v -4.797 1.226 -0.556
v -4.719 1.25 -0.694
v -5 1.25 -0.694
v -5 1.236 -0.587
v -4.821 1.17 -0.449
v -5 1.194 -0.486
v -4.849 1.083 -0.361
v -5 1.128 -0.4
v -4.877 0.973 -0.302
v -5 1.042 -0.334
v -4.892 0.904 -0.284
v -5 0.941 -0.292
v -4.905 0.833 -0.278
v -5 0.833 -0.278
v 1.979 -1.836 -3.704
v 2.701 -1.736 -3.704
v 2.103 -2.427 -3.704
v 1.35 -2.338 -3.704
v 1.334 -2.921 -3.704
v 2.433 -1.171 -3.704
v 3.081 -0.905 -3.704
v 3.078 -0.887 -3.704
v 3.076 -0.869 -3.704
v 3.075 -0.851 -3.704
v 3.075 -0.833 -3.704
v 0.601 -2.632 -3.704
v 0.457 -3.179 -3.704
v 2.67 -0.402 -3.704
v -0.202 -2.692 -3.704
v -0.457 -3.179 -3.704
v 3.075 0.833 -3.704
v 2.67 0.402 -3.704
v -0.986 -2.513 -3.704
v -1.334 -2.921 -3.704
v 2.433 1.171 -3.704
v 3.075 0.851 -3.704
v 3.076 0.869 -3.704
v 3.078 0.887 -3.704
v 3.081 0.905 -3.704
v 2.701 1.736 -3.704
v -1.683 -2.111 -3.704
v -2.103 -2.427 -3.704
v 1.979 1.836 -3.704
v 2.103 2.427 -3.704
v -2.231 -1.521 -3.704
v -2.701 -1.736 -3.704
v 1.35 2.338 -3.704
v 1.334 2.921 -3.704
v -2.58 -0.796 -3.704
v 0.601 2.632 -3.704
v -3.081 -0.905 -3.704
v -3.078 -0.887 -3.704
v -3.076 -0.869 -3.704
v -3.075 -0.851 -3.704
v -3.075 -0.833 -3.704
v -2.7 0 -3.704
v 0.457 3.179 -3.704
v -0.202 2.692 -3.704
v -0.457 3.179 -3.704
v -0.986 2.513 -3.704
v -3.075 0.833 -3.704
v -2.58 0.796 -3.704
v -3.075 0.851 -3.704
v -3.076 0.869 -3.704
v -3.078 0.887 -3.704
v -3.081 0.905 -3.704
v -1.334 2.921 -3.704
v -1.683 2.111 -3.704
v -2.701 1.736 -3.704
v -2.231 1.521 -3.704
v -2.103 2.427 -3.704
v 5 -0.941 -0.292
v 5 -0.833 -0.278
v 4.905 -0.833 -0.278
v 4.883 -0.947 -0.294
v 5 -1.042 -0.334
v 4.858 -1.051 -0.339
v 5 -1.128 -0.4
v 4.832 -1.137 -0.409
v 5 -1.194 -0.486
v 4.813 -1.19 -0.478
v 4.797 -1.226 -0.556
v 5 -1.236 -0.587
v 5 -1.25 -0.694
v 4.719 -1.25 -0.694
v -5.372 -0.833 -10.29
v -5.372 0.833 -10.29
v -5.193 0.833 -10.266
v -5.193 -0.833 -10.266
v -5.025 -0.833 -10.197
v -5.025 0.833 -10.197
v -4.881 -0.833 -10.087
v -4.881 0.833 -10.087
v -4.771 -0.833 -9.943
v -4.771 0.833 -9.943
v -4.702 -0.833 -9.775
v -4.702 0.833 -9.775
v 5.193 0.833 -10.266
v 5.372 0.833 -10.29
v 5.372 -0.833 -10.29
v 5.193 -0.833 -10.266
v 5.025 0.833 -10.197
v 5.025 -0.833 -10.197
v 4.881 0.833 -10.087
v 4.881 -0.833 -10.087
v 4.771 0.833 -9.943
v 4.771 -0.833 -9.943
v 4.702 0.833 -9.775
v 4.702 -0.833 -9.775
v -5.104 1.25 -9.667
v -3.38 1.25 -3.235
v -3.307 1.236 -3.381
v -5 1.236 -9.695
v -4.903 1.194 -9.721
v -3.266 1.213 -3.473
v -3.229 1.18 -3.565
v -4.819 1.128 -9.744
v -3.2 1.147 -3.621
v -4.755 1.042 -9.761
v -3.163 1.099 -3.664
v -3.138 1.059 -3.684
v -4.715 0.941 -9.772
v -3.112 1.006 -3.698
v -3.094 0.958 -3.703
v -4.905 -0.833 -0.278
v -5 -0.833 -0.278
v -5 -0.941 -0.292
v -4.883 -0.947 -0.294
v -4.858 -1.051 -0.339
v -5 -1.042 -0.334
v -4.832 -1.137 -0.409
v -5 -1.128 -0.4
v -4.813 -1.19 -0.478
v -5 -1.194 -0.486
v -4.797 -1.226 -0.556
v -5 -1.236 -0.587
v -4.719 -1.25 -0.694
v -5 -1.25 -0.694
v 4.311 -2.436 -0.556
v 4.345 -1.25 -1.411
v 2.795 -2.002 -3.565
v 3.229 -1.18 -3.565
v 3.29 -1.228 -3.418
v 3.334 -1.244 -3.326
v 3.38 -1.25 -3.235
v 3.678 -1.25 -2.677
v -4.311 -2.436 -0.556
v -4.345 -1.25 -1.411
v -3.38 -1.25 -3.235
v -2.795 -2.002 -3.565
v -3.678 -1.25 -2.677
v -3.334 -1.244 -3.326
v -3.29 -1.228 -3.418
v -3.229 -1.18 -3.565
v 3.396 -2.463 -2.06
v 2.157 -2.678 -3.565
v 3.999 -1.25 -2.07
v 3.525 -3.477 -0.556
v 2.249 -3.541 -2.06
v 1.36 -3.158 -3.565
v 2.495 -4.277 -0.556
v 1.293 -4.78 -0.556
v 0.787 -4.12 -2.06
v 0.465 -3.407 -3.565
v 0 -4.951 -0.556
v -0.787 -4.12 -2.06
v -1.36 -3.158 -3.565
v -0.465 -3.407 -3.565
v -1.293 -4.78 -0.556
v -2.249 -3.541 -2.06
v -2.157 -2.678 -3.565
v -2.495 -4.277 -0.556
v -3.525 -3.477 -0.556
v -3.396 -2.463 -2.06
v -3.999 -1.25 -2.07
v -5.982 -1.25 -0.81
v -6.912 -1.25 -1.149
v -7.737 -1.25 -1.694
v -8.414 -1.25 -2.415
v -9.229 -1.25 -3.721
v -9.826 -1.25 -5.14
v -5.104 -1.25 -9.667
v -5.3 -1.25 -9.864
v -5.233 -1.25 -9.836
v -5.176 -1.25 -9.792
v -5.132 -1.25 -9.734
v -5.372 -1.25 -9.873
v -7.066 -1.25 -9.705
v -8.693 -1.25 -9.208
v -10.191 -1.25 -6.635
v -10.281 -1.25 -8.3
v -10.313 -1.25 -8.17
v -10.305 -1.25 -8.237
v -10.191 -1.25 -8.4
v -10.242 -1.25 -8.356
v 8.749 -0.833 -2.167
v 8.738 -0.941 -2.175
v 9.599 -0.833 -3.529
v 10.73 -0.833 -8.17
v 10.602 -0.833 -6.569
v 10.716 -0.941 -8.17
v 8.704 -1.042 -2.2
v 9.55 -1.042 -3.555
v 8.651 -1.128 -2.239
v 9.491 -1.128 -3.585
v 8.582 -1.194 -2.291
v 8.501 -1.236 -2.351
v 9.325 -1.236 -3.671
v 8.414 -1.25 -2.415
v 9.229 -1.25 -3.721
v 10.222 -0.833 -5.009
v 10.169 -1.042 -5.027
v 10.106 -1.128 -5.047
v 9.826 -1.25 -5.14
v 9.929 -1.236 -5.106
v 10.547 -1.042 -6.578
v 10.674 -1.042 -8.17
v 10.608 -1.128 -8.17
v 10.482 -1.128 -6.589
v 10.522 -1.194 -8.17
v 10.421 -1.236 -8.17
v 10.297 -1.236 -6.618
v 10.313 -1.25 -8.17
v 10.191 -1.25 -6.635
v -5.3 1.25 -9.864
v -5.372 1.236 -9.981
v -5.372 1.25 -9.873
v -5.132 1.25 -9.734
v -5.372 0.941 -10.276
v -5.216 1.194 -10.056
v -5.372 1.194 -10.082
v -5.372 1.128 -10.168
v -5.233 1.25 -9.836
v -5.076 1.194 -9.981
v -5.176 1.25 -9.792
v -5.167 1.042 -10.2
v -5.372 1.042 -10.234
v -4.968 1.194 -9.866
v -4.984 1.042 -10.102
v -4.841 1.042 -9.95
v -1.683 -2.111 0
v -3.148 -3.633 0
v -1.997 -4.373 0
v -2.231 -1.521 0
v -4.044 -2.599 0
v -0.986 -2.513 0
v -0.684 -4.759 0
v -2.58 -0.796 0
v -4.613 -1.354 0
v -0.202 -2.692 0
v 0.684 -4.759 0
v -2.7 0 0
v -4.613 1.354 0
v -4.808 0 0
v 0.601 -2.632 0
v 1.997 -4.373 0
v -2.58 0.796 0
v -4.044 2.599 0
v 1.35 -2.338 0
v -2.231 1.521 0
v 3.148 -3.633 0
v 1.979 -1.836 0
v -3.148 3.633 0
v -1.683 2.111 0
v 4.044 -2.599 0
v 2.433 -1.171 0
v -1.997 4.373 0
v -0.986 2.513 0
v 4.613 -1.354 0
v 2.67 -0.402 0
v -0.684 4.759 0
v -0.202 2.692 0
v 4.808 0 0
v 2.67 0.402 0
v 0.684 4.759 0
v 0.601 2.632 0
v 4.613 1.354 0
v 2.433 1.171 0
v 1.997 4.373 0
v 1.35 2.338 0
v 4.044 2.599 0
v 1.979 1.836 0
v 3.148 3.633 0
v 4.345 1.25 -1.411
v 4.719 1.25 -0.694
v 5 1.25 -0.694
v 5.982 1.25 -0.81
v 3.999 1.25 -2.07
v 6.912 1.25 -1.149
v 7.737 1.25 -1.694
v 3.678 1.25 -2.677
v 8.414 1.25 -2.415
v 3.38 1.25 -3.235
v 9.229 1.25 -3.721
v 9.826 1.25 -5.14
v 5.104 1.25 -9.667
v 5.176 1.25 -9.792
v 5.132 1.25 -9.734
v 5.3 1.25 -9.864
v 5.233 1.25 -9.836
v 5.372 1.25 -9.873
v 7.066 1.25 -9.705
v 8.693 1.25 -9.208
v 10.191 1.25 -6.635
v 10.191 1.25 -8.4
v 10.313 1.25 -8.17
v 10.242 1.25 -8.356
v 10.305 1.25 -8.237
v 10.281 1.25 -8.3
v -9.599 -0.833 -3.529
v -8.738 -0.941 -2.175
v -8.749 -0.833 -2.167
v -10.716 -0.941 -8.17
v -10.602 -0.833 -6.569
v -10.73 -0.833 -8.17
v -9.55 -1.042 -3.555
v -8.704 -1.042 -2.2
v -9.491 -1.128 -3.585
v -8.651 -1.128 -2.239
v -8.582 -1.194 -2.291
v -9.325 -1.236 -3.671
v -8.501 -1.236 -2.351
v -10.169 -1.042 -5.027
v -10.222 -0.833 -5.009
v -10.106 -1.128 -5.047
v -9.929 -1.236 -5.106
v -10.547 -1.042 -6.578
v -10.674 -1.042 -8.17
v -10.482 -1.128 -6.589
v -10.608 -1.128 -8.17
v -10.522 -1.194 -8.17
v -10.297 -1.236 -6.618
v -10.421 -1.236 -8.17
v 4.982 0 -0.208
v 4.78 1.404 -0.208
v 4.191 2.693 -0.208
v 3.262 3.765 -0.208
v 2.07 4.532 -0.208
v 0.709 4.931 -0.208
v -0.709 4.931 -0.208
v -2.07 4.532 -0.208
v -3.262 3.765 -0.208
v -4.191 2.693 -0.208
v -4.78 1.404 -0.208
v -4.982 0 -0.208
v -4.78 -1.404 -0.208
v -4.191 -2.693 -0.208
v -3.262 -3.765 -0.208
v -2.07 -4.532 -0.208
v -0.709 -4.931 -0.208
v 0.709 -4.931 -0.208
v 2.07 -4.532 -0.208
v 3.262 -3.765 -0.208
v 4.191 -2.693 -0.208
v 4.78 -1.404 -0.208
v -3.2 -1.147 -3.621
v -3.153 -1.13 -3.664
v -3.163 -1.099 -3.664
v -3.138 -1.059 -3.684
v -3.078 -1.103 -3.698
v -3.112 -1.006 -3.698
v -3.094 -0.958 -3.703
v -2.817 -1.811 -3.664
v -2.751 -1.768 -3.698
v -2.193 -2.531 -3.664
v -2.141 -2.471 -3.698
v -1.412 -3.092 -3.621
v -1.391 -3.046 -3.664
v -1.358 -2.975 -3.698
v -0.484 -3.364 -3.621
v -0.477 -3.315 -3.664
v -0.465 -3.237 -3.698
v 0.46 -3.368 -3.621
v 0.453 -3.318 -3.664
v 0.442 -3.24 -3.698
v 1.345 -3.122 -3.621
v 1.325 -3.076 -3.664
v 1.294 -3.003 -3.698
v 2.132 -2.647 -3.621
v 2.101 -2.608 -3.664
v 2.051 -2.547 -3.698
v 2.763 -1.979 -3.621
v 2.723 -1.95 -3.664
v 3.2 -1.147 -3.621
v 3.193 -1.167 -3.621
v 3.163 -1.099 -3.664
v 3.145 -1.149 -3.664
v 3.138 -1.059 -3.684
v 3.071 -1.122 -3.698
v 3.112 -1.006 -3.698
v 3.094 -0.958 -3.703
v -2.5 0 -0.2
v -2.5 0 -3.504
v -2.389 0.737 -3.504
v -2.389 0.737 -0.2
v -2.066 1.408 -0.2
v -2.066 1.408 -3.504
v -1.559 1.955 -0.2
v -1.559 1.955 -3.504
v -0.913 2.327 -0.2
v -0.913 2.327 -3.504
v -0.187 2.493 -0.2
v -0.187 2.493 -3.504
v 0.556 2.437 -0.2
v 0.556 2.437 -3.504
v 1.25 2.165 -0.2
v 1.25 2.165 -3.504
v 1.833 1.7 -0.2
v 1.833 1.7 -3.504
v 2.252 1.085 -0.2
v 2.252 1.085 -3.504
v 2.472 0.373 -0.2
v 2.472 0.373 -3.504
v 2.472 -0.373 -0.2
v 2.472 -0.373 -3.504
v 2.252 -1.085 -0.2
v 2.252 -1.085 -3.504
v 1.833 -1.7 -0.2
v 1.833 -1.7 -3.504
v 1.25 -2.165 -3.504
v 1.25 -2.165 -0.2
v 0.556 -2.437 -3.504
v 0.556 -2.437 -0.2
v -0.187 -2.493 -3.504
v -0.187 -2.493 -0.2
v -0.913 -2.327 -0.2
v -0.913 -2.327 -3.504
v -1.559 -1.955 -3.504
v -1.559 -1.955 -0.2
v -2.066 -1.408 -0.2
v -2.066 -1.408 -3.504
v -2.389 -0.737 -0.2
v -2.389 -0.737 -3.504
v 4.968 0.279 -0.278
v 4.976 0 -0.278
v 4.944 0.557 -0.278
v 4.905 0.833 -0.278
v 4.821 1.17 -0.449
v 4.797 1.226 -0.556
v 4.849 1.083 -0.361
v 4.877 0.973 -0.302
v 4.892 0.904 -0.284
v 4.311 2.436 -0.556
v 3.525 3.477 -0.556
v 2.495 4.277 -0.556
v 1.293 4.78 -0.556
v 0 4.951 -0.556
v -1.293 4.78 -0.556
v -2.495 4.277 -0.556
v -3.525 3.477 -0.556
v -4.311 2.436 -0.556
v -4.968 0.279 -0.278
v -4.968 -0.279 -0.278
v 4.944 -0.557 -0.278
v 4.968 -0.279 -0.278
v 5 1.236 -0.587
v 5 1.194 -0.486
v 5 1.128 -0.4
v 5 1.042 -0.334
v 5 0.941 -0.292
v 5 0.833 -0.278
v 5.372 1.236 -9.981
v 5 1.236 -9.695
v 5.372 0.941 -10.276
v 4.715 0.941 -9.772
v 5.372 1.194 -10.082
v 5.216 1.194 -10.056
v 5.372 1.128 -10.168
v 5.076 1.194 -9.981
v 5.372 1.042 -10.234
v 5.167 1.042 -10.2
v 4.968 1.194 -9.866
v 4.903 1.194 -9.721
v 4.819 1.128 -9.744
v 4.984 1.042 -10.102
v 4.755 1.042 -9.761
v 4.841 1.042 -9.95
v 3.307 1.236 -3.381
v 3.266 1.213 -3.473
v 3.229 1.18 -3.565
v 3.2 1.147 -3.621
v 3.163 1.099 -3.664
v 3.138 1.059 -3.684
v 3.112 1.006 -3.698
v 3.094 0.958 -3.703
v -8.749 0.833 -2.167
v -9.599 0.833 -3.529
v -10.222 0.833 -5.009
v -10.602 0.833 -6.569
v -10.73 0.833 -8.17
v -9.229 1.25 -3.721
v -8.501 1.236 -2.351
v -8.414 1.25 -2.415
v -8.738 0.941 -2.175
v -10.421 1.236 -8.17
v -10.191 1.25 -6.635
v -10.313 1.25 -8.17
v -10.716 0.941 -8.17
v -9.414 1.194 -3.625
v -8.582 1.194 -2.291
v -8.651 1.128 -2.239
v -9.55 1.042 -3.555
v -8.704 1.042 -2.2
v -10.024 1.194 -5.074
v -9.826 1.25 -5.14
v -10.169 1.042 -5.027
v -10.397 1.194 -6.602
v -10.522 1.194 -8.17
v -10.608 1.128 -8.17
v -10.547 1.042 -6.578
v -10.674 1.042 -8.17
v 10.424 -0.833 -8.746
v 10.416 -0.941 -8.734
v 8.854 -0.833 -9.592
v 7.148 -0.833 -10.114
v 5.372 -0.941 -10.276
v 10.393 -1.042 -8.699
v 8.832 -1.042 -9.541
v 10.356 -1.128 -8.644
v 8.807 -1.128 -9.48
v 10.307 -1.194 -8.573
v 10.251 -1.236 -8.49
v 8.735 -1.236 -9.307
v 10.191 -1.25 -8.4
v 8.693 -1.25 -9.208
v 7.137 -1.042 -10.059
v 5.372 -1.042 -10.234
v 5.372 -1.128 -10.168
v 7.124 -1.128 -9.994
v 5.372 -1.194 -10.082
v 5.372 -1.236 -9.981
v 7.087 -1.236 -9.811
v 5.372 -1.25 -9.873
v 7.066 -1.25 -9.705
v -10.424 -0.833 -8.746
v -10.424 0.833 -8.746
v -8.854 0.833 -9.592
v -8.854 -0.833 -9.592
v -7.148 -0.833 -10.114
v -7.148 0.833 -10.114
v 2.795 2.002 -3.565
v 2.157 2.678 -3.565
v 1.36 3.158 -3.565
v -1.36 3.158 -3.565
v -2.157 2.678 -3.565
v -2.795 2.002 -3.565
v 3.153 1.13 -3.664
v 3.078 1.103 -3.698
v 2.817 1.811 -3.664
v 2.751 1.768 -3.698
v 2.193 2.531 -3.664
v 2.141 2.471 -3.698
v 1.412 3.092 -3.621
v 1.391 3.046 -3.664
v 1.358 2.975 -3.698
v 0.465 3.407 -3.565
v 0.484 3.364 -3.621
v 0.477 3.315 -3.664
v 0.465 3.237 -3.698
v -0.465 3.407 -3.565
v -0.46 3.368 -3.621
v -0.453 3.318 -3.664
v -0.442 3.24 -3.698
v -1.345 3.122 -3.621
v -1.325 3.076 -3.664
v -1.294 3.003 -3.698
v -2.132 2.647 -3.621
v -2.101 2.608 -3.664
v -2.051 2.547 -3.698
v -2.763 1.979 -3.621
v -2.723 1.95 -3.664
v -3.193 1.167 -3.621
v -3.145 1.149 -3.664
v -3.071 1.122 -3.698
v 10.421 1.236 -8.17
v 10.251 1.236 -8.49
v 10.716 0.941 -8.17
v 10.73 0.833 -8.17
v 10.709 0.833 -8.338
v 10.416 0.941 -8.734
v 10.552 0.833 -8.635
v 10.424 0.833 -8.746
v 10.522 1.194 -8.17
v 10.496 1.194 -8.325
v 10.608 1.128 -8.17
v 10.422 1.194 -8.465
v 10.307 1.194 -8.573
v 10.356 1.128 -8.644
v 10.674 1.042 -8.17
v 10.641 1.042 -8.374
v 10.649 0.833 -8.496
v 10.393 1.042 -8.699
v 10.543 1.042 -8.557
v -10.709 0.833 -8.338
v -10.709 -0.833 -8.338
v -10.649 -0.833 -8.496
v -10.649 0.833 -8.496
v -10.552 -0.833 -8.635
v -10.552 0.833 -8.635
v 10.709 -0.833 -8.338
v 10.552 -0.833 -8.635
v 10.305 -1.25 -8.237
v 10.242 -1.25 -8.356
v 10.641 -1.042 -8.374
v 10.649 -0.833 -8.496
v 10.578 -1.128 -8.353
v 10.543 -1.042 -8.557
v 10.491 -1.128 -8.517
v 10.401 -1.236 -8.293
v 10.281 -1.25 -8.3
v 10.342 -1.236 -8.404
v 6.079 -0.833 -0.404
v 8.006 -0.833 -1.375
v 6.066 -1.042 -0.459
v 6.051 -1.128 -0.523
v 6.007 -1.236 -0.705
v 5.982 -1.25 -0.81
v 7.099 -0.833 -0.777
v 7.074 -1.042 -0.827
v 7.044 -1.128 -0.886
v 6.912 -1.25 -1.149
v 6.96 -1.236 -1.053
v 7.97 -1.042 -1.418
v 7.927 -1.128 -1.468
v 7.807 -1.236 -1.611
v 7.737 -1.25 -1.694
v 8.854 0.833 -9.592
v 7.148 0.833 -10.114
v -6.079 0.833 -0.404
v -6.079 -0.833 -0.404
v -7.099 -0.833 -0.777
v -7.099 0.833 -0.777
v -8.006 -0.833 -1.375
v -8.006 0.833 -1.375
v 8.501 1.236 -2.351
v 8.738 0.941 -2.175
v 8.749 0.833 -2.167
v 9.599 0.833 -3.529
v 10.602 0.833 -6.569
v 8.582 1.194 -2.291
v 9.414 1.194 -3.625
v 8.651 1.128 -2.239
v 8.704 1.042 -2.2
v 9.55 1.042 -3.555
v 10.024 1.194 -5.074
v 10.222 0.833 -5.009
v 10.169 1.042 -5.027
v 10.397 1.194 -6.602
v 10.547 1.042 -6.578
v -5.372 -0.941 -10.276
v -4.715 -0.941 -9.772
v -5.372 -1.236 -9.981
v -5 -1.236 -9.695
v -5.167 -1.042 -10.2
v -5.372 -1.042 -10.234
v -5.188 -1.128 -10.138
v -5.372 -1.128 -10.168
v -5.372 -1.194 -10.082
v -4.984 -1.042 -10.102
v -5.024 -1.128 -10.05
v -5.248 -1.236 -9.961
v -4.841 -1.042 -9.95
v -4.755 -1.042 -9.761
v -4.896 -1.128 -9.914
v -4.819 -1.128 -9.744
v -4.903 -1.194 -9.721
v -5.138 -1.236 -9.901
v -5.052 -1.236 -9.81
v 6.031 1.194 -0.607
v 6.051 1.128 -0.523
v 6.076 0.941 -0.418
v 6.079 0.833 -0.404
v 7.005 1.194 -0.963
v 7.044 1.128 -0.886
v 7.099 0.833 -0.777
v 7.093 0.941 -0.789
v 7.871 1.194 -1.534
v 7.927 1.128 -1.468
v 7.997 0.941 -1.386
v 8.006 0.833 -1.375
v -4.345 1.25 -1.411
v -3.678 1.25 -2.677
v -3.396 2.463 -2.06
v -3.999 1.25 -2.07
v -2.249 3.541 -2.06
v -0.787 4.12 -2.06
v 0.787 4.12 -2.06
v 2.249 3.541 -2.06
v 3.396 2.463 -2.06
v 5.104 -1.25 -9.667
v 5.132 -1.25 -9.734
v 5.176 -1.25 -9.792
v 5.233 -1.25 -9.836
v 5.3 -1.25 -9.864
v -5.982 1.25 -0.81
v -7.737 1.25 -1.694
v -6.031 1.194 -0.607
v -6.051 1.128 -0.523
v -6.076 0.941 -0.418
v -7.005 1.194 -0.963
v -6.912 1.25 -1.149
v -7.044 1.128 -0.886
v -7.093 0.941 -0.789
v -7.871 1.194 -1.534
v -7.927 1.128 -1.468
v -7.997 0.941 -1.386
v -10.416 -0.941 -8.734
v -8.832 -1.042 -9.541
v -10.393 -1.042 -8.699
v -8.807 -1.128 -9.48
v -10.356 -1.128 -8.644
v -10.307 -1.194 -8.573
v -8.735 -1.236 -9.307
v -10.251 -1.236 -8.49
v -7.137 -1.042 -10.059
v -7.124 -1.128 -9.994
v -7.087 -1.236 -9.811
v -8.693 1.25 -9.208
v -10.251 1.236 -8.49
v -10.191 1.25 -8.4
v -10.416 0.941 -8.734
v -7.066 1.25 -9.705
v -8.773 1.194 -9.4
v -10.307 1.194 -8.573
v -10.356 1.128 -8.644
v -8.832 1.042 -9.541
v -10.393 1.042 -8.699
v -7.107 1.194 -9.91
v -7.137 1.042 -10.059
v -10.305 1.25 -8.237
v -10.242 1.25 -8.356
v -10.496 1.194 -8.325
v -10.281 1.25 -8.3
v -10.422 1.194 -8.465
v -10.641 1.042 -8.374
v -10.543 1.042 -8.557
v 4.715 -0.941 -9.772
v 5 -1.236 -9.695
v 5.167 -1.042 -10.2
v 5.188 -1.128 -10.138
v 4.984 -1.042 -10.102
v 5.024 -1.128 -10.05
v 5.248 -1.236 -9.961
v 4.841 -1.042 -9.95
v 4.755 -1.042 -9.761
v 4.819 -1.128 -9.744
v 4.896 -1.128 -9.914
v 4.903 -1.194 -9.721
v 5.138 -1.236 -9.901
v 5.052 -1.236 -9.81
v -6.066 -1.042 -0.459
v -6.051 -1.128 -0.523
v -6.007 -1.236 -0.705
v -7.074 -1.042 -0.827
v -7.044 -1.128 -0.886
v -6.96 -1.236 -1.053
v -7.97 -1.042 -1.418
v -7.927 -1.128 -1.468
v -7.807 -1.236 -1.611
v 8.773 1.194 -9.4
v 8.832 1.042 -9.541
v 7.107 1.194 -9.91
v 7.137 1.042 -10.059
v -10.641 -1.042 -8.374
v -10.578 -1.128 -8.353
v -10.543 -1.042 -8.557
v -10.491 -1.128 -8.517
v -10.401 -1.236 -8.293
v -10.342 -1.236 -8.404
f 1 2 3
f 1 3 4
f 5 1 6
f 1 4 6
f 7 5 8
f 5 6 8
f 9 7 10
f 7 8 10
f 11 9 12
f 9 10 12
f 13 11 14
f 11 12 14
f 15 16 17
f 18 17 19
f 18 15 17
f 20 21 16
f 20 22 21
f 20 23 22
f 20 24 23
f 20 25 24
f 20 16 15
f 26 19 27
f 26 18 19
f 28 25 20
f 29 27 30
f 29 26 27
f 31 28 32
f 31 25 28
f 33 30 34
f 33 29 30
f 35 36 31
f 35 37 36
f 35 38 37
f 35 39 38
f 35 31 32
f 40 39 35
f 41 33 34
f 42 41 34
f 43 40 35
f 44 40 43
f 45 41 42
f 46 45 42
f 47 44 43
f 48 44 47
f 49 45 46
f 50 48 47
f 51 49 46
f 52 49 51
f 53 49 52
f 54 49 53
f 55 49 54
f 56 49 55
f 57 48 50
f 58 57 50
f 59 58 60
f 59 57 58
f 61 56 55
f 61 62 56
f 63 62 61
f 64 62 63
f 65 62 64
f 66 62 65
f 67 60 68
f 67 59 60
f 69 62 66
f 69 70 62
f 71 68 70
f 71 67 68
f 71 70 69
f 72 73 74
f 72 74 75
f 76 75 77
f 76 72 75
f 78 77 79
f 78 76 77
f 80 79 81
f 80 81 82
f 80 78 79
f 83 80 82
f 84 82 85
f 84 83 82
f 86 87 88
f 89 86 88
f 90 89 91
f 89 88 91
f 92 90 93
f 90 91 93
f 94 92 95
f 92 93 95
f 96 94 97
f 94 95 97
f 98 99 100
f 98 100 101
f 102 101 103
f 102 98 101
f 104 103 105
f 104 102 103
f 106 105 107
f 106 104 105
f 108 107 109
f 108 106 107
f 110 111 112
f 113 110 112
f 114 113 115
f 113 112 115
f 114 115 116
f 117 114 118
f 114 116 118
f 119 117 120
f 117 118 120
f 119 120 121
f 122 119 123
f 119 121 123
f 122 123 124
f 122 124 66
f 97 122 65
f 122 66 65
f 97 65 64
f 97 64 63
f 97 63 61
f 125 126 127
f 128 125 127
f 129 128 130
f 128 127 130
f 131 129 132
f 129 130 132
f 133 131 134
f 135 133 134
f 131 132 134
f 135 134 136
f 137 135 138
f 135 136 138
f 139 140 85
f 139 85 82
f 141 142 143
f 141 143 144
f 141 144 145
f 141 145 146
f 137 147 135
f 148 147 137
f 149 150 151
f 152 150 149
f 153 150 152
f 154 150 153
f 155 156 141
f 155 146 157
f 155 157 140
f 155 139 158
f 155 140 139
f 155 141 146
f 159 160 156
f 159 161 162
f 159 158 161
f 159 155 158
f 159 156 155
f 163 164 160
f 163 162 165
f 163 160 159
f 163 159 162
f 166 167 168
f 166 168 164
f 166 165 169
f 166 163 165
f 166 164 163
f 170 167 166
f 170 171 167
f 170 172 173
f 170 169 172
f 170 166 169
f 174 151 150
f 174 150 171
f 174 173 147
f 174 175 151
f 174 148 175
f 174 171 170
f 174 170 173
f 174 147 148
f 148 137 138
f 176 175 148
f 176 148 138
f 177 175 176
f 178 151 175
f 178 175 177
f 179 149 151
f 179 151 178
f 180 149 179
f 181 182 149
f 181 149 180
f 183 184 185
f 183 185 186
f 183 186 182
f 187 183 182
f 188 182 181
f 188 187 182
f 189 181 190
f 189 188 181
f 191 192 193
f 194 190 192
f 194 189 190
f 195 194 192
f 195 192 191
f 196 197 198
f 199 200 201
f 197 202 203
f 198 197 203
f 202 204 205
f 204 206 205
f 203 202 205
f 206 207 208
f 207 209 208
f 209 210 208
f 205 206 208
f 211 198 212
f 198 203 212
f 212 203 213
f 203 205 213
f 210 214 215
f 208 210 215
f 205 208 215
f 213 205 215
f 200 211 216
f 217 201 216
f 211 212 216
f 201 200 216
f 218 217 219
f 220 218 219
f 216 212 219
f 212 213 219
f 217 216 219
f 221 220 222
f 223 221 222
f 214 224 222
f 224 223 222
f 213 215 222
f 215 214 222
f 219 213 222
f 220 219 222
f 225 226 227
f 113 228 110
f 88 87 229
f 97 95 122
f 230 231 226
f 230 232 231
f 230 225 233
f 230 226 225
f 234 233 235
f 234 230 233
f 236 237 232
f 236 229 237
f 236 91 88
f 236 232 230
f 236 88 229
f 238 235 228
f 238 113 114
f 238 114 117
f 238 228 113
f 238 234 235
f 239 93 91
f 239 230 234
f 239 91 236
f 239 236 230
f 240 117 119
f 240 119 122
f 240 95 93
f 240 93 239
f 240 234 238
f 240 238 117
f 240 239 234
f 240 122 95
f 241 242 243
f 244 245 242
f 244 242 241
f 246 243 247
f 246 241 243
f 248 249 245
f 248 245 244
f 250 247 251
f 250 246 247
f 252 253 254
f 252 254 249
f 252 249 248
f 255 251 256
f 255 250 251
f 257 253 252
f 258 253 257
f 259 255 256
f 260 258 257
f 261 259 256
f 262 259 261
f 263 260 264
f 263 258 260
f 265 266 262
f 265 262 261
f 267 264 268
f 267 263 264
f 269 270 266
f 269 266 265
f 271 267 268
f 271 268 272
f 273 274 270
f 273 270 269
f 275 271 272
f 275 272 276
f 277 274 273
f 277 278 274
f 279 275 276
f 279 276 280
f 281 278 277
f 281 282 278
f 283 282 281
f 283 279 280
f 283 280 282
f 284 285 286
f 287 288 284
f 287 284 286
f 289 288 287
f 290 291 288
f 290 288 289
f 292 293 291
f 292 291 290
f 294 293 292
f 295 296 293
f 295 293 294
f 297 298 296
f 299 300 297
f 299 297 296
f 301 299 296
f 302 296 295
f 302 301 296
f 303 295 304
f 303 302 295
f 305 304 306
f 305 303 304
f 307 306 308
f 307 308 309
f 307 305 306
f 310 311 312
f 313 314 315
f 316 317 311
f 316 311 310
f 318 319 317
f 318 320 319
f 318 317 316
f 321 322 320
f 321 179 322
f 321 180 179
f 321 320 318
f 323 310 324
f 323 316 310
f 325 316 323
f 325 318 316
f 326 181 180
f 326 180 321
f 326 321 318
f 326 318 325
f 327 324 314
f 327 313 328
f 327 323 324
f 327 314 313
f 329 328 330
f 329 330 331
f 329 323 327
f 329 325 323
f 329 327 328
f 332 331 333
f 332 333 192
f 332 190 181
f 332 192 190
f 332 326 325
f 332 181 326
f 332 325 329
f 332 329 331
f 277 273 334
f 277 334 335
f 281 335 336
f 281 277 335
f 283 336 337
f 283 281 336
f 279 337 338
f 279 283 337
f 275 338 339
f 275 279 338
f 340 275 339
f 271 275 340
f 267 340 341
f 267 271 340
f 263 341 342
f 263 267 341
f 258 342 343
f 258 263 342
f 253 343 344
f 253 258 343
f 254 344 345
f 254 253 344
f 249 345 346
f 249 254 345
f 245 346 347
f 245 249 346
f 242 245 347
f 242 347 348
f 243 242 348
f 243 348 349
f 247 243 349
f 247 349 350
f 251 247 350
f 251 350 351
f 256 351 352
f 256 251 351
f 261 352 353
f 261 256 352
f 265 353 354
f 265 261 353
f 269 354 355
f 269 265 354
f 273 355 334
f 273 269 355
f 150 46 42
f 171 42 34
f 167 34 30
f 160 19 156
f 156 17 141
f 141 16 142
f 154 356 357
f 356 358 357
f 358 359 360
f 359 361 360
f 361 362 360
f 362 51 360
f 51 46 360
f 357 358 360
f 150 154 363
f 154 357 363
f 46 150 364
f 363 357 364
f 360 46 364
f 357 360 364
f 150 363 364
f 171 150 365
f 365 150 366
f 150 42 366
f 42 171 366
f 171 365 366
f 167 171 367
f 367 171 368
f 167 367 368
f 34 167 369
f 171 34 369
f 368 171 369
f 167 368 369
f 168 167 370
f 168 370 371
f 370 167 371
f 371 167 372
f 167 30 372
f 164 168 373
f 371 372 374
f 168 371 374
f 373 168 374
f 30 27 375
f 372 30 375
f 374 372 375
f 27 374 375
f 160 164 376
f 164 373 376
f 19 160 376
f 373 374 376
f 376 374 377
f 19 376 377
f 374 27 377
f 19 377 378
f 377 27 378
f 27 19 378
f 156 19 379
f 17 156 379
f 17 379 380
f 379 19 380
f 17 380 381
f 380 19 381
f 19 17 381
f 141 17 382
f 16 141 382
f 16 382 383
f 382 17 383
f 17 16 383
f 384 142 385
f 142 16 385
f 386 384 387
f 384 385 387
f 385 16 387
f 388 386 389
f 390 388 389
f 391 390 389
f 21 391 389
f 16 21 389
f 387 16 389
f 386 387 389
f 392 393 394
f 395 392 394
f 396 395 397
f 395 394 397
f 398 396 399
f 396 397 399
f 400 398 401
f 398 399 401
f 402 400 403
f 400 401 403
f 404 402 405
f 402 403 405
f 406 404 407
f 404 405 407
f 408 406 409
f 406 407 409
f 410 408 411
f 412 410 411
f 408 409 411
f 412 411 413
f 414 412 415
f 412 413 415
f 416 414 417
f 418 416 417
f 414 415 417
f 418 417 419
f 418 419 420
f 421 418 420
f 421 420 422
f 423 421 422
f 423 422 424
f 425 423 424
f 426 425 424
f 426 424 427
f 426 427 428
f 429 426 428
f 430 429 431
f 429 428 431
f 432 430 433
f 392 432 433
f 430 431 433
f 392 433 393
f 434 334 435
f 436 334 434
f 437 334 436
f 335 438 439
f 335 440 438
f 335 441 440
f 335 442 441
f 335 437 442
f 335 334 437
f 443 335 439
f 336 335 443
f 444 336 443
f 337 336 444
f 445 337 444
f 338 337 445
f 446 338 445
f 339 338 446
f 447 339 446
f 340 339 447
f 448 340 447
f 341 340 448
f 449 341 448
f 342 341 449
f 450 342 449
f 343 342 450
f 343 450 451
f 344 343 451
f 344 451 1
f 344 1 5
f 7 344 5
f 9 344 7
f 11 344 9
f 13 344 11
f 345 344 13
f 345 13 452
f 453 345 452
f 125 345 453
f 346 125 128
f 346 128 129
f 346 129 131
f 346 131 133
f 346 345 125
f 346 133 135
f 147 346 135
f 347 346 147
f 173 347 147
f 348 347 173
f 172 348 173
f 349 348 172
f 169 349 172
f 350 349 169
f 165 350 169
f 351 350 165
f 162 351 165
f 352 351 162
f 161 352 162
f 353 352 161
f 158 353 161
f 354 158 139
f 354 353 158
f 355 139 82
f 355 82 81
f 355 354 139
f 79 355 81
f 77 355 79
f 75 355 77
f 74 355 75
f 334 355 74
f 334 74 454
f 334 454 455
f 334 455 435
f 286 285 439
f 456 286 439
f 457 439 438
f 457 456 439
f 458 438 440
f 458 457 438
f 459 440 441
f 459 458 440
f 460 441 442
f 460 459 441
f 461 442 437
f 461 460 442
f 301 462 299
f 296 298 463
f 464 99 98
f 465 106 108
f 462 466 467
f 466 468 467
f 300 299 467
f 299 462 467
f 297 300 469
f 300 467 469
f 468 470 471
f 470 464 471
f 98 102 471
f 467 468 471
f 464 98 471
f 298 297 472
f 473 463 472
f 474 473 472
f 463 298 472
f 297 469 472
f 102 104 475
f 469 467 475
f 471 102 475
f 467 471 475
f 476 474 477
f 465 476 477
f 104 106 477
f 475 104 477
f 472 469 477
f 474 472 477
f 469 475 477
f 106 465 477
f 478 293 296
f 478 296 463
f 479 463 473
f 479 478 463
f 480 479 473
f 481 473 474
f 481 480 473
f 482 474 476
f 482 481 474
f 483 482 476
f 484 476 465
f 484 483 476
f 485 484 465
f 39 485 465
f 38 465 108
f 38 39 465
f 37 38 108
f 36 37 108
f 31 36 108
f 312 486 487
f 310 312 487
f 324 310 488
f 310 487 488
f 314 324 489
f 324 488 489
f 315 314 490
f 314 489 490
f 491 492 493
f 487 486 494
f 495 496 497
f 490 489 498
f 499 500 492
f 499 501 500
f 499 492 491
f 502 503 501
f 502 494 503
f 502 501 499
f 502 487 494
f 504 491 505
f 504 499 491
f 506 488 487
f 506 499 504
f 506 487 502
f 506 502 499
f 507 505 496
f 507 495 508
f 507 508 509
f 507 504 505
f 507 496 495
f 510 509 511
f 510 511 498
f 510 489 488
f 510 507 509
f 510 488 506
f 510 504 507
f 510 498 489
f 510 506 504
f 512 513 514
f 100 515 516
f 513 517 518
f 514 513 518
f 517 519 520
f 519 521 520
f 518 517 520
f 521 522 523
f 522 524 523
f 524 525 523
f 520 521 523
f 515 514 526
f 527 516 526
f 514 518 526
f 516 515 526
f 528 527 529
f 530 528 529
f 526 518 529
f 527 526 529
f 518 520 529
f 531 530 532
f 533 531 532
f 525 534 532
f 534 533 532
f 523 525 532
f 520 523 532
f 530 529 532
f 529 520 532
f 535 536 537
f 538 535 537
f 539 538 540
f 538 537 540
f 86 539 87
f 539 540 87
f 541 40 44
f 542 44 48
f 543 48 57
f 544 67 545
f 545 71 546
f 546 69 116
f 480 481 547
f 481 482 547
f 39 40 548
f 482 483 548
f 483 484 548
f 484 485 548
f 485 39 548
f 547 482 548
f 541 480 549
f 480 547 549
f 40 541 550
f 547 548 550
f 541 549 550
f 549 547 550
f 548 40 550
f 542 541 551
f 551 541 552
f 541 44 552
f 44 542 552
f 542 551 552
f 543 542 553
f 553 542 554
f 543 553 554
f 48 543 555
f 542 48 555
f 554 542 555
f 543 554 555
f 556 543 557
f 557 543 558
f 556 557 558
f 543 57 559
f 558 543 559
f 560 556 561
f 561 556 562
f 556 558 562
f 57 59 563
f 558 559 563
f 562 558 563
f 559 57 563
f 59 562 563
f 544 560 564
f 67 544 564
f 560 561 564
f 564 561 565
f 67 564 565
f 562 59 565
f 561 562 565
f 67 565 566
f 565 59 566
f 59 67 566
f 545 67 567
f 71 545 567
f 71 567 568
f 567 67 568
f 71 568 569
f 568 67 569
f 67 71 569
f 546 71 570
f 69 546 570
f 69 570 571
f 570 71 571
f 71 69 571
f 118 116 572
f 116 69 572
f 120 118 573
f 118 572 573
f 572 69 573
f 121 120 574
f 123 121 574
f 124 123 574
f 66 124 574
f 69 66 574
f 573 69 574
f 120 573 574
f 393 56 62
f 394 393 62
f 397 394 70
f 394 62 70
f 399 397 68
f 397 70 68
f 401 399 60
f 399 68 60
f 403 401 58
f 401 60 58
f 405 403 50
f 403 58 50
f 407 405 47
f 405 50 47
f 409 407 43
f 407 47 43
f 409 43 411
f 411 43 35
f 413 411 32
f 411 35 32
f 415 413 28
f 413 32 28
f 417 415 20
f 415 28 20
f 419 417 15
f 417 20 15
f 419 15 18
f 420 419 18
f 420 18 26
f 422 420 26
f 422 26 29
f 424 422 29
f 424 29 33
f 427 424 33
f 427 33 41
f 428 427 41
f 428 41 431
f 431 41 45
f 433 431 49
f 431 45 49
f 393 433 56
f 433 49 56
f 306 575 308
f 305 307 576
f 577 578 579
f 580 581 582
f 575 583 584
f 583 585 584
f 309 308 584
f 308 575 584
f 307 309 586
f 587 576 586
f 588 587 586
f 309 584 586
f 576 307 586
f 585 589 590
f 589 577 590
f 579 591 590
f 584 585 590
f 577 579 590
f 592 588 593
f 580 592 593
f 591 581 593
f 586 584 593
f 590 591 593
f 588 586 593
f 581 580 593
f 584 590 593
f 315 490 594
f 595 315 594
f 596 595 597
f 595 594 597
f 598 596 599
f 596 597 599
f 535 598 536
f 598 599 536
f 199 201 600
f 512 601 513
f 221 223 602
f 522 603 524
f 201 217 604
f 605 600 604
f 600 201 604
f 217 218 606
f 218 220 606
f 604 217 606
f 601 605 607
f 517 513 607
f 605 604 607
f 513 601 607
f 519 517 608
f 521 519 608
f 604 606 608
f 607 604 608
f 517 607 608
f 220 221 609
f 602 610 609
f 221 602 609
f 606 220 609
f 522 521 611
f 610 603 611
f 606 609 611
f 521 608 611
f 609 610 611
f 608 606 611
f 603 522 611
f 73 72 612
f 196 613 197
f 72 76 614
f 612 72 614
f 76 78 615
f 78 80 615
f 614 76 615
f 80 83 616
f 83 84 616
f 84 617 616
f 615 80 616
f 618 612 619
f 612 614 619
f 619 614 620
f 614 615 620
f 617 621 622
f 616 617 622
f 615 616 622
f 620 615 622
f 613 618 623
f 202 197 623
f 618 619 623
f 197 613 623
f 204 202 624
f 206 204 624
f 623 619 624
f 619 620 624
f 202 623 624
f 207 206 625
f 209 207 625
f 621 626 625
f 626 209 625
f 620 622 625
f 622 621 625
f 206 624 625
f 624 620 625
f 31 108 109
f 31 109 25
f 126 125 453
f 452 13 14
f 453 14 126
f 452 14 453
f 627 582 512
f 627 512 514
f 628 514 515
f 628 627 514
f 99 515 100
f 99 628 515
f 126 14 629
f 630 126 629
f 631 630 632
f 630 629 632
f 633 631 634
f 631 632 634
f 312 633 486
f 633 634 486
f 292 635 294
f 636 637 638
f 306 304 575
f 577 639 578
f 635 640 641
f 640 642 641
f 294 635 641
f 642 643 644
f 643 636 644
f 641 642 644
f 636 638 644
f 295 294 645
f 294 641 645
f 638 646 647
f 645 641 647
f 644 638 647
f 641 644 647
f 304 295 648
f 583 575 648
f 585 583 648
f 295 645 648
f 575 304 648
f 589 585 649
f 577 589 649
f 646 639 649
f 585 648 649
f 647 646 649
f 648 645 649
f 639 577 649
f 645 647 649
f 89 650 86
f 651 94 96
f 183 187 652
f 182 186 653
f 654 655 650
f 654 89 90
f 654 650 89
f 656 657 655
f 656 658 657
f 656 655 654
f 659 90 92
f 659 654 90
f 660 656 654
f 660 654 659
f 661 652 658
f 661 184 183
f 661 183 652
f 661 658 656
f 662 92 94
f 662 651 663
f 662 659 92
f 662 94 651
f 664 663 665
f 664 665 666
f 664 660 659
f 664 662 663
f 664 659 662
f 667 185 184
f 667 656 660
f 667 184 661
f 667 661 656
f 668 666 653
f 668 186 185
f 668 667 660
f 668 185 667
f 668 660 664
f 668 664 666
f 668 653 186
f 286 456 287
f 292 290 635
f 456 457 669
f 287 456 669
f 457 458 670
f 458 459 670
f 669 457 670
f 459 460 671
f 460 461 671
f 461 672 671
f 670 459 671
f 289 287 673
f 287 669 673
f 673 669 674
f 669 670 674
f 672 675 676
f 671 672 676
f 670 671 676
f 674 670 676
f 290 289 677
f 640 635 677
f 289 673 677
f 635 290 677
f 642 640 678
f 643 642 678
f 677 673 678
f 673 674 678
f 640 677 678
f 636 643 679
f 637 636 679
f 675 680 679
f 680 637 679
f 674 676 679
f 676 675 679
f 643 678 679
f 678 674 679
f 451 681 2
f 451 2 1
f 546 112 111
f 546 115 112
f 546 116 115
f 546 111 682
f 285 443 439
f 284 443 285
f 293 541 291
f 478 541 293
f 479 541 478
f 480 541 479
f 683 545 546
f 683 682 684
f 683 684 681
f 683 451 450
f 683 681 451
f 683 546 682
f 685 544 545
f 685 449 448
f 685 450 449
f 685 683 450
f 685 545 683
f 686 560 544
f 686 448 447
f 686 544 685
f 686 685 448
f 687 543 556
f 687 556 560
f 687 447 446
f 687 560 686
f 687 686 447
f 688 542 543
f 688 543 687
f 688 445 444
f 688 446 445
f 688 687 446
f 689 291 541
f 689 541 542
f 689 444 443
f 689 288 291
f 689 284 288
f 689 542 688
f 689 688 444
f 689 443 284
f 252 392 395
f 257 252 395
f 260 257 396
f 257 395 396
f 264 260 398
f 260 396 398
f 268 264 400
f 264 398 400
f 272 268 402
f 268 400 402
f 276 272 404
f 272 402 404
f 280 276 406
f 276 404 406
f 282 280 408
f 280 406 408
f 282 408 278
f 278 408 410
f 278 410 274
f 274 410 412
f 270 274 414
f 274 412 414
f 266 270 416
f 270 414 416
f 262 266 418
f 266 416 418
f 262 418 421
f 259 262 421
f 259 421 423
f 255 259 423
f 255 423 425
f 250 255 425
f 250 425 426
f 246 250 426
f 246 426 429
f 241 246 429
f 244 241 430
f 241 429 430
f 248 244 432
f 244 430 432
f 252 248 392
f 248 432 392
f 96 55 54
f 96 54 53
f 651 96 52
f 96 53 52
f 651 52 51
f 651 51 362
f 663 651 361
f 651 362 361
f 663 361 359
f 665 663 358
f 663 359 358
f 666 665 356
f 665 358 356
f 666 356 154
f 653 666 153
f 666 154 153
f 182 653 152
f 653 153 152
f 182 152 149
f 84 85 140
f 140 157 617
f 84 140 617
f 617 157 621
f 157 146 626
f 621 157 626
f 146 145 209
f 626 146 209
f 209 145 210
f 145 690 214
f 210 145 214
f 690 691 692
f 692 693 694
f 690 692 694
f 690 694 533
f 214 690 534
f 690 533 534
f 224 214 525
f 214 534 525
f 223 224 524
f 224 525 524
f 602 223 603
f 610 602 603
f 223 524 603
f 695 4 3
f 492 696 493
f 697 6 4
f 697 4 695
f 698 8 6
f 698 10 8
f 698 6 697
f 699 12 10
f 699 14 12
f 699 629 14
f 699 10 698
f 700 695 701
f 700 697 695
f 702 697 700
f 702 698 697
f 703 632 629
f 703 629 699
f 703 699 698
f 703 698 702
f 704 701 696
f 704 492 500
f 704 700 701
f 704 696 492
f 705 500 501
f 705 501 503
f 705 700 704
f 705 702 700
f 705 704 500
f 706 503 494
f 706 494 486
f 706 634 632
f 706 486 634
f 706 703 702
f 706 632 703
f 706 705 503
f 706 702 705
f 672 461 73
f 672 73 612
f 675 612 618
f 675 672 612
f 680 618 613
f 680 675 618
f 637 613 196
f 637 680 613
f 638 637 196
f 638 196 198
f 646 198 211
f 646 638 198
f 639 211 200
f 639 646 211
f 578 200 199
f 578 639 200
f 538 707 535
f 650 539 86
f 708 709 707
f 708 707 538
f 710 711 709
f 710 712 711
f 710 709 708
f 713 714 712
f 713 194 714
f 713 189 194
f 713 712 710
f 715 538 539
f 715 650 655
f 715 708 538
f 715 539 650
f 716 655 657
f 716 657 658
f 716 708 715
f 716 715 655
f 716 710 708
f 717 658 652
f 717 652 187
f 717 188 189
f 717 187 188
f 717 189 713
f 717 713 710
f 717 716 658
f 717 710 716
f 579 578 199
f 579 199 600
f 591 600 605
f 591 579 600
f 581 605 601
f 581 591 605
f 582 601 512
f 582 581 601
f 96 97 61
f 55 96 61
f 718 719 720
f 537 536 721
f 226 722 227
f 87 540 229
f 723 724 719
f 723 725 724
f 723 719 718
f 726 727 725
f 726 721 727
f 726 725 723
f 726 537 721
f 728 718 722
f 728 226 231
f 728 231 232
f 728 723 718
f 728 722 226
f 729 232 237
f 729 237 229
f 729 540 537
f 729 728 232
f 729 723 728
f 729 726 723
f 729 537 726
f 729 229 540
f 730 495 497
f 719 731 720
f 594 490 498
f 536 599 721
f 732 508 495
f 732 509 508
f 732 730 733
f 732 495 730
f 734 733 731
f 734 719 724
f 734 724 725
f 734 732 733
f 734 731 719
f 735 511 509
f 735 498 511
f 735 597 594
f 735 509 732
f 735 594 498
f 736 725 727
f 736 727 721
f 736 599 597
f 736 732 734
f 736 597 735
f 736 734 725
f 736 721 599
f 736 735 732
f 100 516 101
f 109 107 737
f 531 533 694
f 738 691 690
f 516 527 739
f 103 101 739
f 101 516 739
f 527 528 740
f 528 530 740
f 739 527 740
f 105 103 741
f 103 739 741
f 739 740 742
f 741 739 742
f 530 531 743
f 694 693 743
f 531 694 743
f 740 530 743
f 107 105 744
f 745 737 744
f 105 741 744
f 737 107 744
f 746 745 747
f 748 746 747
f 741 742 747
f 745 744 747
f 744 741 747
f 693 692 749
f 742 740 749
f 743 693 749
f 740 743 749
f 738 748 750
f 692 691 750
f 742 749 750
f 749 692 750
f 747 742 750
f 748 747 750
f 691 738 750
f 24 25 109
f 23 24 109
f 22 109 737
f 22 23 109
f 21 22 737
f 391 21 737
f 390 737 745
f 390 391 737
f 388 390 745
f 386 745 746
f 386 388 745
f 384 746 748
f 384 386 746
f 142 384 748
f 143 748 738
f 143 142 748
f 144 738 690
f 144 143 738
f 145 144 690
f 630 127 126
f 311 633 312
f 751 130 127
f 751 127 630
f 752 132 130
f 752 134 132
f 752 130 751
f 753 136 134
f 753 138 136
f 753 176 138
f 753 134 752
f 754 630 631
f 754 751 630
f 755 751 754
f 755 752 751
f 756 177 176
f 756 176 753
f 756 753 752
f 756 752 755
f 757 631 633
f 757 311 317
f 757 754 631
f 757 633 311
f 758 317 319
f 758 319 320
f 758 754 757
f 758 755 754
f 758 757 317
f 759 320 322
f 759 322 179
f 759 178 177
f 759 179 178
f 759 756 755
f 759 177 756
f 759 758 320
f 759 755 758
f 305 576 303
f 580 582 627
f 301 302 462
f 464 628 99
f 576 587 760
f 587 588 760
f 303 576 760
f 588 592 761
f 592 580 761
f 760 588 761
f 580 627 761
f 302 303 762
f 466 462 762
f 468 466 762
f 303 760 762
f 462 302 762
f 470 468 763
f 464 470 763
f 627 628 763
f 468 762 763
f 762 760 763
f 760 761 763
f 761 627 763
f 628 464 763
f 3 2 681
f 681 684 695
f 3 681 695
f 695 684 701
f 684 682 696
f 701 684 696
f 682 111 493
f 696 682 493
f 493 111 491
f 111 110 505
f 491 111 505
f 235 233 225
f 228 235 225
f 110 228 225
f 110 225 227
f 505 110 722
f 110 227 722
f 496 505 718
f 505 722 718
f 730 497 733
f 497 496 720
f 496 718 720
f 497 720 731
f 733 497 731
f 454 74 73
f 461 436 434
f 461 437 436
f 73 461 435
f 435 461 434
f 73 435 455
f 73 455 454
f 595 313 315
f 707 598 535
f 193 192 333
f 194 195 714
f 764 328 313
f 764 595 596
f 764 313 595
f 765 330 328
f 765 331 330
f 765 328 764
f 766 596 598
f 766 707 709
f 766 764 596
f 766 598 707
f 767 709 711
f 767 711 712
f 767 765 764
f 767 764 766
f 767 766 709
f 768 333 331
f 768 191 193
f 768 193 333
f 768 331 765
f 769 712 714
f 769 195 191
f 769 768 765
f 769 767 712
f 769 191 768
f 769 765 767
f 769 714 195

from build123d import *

# Parameters (mm, degrees)
EXTRUDE2_DEPTH      = 1.25
SKETCH3_R           = 5
EXTRUDE1_DEPTH      = 0.55566
EXTRUDE1_DRAFT      = -5
SKETCH15_R          = 4.951386049
EXTRUDE3_DEPTH      = 3.14874
EXTRUDE3_TAPER      = 26.698437176
FILLET3_R           = 0.254
SKETCH4_R           = 2.5
CUT_EXTRUDE1_DEPTH  = 16.684929072
SWEEP1_PITCH        = 0.8
SKETCH7_R           = 5
CUT_EXTRUDE2_DEPTH  = 16.684929104
SKETCH8_R           = 4.951386049
CUT_EXTRUDE3_DEPTH  = 14.546328962
SKETCH11_R          = 2.4492
CUT_EXTRUDE5_DEPTH  = 14.546328926
CUT_EXTRUDE5_TAPER  = 45
CHAMFER1_SIZE       = 0.2083725
CHAMFER1_SIZE2      = 0.192340809
FILLET4_R           = 0.416666667
SKETCH18_R          = 3.211270087
BOSS_EXTRUDE3_DEPTH = 3.7044
SKETCH19_R          = 2.5
CUT_EXTRUDE6_DEPTH  = 3.7044
CHAMFER2_SIZE       = 0.2


with BuildPart() as part:
    # Sketch13 → Extrude2 (new, symmetric)
    with BuildSketch(Plane(origin=(0, 0, 0), x_dir=(1, 0, 0), z_dir=(0, 1, 0))):
        with BuildLine():
            Line((3.074810737, 0.27783), (5, 0.27783))
            ThreePointArc((5, 0.27783), (7.099129938, 0.776746992), (8.749295866, 2.166789103))
            ThreePointArc((8.749295866, 2.166789103), (10.222034162, 5.009156698), (10.73, 8.169850029))
            ThreePointArc((10.73, 8.169850029), (10.648713606, 8.495871948), (10.423883961, 8.745570566))
            ThreePointArc((10.423883961, 8.745570566), (8.013491694, 9.895268701), (5.372282902, 10.29))
            ThreePointArc((5.372282902, 10.29), (4.94953191, 10.146495375), (4.701501078, 9.775291004))
            Line((4.701501078, 9.775291004), (3.074810737, 3.7044))
            Line((3.074810737, 3.7044), (3.074810737, 0.27783))
        make_face()
    extrude(amount=EXTRUDE2_DEPTH, both=True)

    # Fillet4
    fillet4_edges = [part.edges().sort_by_distance(p)[0] for p in [
        (7.099129938, 1.25, -0.776746992),
        (10.222034162, 1.25, -5.009156698),
        (10.648713606, 1.25, -8.495871948),
        (8.013491694, 1.25, -9.895268701),
        (4.94953191, 1.25, -10.146495375),
        (3.888155907, 1.25, -6.739845502),
        (3.888155907, -1.25, -6.739845502),
        (4.037405368, 1.25, -0.27783),
        (4.94953191, -1.25, -10.146495375),
        (8.013491694, -1.25, -9.895268701),
        (10.648713606, -1.25, -8.495871948),
        (10.222034162, -1.25, -5.009156698),
        (7.099129938, -1.25, -0.776746992),
        (4.037405368, -1.25, -0.27783),
    ]]
    fillet(fillet4_edges, radius=FILLET4_R)


with BuildPart() as body_2:
    # Sketch3 → Extrude1 (with draft: the straight prism first)
    with BuildSketch(Plane.XY):
        Circle(SKETCH3_R)
    extrude(amount=-EXTRUDE1_DEPTH)
    # Extrude1: the draft: its side faces are tilted about the plane it starts from
    extrude1_sides = [body_2.faces().sort_by_distance(p)[0] for p in [
        (-5, 0, -0.27783),
    ]]
    draft(extrude1_sides, Plane.XY, EXTRUDE1_DRAFT)

    # Sketch15 → Extrude3 (add)
    with BuildSketch(Plane(origin=(0, 0, -0.55566), x_dir=(-1, 0, 0), z_dir=(0, 0, -1))):
        Circle(SKETCH15_R)
    extrude(amount=EXTRUDE3_DEPTH, taper=EXTRUDE3_TAPER)

    # Fillet3
    fillet3_edges = [body_2.edges().sort_by_distance(p)[0] for p in [
        (3.367842423, 0, -3.7044),
    ]]
    fillet(fillet3_edges, radius=FILLET3_R)

    # Sketch4 → Cut-Extrude1 (cut, through all)
    with BuildSketch(Plane.XY):
        Circle(SKETCH4_R)
    extrude(amount=-CUT_EXTRUDE1_DEPTH, mode=Mode.SUBTRACT)

    # Sweep1: the profile of Sketch6 profile screwed along a right-hand helix of 7.1305 turns, 6 arcs to a turn; built about Z, then put on its axis
    sweep1_z = Axis((0, 0, 0), (0, 0, 1))
    sweep1_corners = [(2.5003, 0, -0.700173205), (1.980384758, 0, -0.4), (1.980384758, 0, -0.3), (2.5003, 0, 0.000173205)]
    with BuildLine(mode=Mode.PRIVATE) as sweep1_profile:
        Line(sweep1_corners[0], sweep1_corners[1])
        Line(sweep1_corners[1], sweep1_corners[2])
        Line(sweep1_corners[2], sweep1_corners[3])
        Line(sweep1_corners[3], sweep1_corners[0])
    sweep1_cap = Face(sweep1_profile.wire())
    sweep1_turn_angles = [0, 30, 60, 90, 120, 150, 180, 210, 240, 270, 300, 330, 360]
    sweep1_turn_weights = [1, 0.8660254037844387, 1, 0.8660254037844387, 1, 0.8660254037844387, 1, 0.8660254037844387, 1, 0.8660254037844387, 1, 0.8660254037844387, 1]
    sweep1_turn_rails = [Edge.make_bspline([Vector(p[0], p[1], 0).rotate(sweep1_z, sweep1_turn_angles[k]) / sweep1_turn_weights[k] + Vector(0, 0, p[2] + SWEEP1_PITCH * sweep1_turn_angles[k] / 360) for k in range(13)], [0, 0, 0, 1, 1, 2, 2, 3, 3, 4, 4, 5, 5, 6, 6, 6], 2, sweep1_turn_weights) for p in sweep1_corners]
    sweep1_turn_sides = [Face.make_surface_from_curves(sweep1_turn_rails[p[0]], sweep1_turn_rails[p[1]]) for p in [(0, 1), (1, 2), (2, 3), (3, 0)]]
    sweep1_last_angles = [2520, 2543.49, 2566.98]
    sweep1_last_weights = [1, 0.9171296552585544, 1]
    sweep1_last_rails = [Edge.make_bspline([Vector(p[0], p[1], 0).rotate(sweep1_z, sweep1_last_angles[k]) / sweep1_last_weights[k] + Vector(0, 0, p[2] + SWEEP1_PITCH * sweep1_last_angles[k] / 360) for k in range(3)], [0, 0, 0, 1, 1, 1], 2, sweep1_last_weights) for p in sweep1_corners]
    sweep1_last_sides = [Face.make_surface_from_curves(sweep1_last_rails[p[0]], sweep1_last_rails[p[1]]) for p in [(0, 1), (1, 2), (2, 3), (3, 0)]]
    sweep1 = Plane(origin=(0, 0, 0), x_dir=(-1, 0, 0), z_dir=(0, 0, -1)) * Solid(Shell([*[p.moved(Location((0, 0, SWEEP1_PITCH * i))) for i in range(7) for p in sweep1_turn_sides], *sweep1_last_sides, sweep1_cap, sweep1_cap.rotate(sweep1_z, 2566.98).moved(Location((0, 0, SWEEP1_PITCH * 2566.98 / 360)))]))
    add(sweep1)

    # Sketch7 → Cut-Extrude2 (cut, through all)
    with BuildSketch(Plane.XY):
        Circle(SKETCH7_R)
    extrude(amount=CUT_EXTRUDE2_DEPTH, mode=Mode.SUBTRACT)

    # Sketch8 → Cut-Extrude3 (cut, through all)
    with BuildSketch(Plane.XY.offset(-3.7044)):
        Circle(SKETCH8_R)
    extrude(amount=-CUT_EXTRUDE3_DEPTH, mode=Mode.SUBTRACT)

    # Cut-Extrude4 cone 1 section (through the dimple's axis) → Cut-Extrude4 (revolve, cut)
    with BuildSketch(Plane(origin=(0, 0, 0), x_dir=(0, -1, 0), z_dir=(1, 0, 0))):
        Polygon((0, 0), (2.5, 0), (0, 2.5), align=None)
    revolve(axis=Axis((0, 0, 0), (0, 0, -1)), mode=Mode.SUBTRACT)

    # Sketch11 → Cut-Extrude5 (cut, through all)
    with BuildSketch(Plane.XY.offset(-3.7044)):
        Circle(SKETCH11_R)
    extrude(amount=CUT_EXTRUDE5_DEPTH, taper=CUT_EXTRUDE5_TAPER, mode=Mode.SUBTRACT)

    # Chamfer1
    chamfer1_edges = [body_2.edges().sort_by_distance(p)[0] for p in [
        (-5, 0, 0),
    ]]
    chamfer1_side = [body_2.faces().sort_by_distance(p)[0] for p in [
        (-4.975693025, 0, -0.27783),
    ]]
    chamfer(chamfer1_edges, length=CHAMFER1_SIZE, length2=CHAMFER1_SIZE2, reference=chamfer1_side[0])


with BuildPart() as body_3:
    # Mirror6: mirrored copy
    add(part.part.mirror(Plane(origin=(0, 0, 0), x_dir=(0, 0, 1), z_dir=(1, 0, 0))))

    # Combine2: union part, body 2
    add(part.part)
    add(body_2.part)

    # Sketch18 → Boss-Extrude3 (add)
    with BuildSketch(Plane(origin=(0, 0, -3.7044), x_dir=(-1, 0, 0), z_dir=(0, 0, -1))):
        Circle(SKETCH18_R)
    extrude(amount=-BOSS_EXTRUDE3_DEPTH)

    # Sketch19 → Cut-Extrude6 (cut)
    with BuildSketch(Plane(origin=(0, 0, -3.7044), x_dir=(-1, 0, 0), z_dir=(0, 0, -1))):
        Circle(SKETCH19_R)
    extrude(amount=-CUT_EXTRUDE6_DEPTH, mode=Mode.SUBTRACT)

    # Chamfer2
    chamfer2_edges = [body_3.edges().sort_by_distance(p)[0] for p in [
        (2.5, 0, -3.7044),
        (2.5, 0, 0),
    ]]
    chamfer(chamfer2_edges, length=CHAMFER2_SIZE)


solid = body_3.part
